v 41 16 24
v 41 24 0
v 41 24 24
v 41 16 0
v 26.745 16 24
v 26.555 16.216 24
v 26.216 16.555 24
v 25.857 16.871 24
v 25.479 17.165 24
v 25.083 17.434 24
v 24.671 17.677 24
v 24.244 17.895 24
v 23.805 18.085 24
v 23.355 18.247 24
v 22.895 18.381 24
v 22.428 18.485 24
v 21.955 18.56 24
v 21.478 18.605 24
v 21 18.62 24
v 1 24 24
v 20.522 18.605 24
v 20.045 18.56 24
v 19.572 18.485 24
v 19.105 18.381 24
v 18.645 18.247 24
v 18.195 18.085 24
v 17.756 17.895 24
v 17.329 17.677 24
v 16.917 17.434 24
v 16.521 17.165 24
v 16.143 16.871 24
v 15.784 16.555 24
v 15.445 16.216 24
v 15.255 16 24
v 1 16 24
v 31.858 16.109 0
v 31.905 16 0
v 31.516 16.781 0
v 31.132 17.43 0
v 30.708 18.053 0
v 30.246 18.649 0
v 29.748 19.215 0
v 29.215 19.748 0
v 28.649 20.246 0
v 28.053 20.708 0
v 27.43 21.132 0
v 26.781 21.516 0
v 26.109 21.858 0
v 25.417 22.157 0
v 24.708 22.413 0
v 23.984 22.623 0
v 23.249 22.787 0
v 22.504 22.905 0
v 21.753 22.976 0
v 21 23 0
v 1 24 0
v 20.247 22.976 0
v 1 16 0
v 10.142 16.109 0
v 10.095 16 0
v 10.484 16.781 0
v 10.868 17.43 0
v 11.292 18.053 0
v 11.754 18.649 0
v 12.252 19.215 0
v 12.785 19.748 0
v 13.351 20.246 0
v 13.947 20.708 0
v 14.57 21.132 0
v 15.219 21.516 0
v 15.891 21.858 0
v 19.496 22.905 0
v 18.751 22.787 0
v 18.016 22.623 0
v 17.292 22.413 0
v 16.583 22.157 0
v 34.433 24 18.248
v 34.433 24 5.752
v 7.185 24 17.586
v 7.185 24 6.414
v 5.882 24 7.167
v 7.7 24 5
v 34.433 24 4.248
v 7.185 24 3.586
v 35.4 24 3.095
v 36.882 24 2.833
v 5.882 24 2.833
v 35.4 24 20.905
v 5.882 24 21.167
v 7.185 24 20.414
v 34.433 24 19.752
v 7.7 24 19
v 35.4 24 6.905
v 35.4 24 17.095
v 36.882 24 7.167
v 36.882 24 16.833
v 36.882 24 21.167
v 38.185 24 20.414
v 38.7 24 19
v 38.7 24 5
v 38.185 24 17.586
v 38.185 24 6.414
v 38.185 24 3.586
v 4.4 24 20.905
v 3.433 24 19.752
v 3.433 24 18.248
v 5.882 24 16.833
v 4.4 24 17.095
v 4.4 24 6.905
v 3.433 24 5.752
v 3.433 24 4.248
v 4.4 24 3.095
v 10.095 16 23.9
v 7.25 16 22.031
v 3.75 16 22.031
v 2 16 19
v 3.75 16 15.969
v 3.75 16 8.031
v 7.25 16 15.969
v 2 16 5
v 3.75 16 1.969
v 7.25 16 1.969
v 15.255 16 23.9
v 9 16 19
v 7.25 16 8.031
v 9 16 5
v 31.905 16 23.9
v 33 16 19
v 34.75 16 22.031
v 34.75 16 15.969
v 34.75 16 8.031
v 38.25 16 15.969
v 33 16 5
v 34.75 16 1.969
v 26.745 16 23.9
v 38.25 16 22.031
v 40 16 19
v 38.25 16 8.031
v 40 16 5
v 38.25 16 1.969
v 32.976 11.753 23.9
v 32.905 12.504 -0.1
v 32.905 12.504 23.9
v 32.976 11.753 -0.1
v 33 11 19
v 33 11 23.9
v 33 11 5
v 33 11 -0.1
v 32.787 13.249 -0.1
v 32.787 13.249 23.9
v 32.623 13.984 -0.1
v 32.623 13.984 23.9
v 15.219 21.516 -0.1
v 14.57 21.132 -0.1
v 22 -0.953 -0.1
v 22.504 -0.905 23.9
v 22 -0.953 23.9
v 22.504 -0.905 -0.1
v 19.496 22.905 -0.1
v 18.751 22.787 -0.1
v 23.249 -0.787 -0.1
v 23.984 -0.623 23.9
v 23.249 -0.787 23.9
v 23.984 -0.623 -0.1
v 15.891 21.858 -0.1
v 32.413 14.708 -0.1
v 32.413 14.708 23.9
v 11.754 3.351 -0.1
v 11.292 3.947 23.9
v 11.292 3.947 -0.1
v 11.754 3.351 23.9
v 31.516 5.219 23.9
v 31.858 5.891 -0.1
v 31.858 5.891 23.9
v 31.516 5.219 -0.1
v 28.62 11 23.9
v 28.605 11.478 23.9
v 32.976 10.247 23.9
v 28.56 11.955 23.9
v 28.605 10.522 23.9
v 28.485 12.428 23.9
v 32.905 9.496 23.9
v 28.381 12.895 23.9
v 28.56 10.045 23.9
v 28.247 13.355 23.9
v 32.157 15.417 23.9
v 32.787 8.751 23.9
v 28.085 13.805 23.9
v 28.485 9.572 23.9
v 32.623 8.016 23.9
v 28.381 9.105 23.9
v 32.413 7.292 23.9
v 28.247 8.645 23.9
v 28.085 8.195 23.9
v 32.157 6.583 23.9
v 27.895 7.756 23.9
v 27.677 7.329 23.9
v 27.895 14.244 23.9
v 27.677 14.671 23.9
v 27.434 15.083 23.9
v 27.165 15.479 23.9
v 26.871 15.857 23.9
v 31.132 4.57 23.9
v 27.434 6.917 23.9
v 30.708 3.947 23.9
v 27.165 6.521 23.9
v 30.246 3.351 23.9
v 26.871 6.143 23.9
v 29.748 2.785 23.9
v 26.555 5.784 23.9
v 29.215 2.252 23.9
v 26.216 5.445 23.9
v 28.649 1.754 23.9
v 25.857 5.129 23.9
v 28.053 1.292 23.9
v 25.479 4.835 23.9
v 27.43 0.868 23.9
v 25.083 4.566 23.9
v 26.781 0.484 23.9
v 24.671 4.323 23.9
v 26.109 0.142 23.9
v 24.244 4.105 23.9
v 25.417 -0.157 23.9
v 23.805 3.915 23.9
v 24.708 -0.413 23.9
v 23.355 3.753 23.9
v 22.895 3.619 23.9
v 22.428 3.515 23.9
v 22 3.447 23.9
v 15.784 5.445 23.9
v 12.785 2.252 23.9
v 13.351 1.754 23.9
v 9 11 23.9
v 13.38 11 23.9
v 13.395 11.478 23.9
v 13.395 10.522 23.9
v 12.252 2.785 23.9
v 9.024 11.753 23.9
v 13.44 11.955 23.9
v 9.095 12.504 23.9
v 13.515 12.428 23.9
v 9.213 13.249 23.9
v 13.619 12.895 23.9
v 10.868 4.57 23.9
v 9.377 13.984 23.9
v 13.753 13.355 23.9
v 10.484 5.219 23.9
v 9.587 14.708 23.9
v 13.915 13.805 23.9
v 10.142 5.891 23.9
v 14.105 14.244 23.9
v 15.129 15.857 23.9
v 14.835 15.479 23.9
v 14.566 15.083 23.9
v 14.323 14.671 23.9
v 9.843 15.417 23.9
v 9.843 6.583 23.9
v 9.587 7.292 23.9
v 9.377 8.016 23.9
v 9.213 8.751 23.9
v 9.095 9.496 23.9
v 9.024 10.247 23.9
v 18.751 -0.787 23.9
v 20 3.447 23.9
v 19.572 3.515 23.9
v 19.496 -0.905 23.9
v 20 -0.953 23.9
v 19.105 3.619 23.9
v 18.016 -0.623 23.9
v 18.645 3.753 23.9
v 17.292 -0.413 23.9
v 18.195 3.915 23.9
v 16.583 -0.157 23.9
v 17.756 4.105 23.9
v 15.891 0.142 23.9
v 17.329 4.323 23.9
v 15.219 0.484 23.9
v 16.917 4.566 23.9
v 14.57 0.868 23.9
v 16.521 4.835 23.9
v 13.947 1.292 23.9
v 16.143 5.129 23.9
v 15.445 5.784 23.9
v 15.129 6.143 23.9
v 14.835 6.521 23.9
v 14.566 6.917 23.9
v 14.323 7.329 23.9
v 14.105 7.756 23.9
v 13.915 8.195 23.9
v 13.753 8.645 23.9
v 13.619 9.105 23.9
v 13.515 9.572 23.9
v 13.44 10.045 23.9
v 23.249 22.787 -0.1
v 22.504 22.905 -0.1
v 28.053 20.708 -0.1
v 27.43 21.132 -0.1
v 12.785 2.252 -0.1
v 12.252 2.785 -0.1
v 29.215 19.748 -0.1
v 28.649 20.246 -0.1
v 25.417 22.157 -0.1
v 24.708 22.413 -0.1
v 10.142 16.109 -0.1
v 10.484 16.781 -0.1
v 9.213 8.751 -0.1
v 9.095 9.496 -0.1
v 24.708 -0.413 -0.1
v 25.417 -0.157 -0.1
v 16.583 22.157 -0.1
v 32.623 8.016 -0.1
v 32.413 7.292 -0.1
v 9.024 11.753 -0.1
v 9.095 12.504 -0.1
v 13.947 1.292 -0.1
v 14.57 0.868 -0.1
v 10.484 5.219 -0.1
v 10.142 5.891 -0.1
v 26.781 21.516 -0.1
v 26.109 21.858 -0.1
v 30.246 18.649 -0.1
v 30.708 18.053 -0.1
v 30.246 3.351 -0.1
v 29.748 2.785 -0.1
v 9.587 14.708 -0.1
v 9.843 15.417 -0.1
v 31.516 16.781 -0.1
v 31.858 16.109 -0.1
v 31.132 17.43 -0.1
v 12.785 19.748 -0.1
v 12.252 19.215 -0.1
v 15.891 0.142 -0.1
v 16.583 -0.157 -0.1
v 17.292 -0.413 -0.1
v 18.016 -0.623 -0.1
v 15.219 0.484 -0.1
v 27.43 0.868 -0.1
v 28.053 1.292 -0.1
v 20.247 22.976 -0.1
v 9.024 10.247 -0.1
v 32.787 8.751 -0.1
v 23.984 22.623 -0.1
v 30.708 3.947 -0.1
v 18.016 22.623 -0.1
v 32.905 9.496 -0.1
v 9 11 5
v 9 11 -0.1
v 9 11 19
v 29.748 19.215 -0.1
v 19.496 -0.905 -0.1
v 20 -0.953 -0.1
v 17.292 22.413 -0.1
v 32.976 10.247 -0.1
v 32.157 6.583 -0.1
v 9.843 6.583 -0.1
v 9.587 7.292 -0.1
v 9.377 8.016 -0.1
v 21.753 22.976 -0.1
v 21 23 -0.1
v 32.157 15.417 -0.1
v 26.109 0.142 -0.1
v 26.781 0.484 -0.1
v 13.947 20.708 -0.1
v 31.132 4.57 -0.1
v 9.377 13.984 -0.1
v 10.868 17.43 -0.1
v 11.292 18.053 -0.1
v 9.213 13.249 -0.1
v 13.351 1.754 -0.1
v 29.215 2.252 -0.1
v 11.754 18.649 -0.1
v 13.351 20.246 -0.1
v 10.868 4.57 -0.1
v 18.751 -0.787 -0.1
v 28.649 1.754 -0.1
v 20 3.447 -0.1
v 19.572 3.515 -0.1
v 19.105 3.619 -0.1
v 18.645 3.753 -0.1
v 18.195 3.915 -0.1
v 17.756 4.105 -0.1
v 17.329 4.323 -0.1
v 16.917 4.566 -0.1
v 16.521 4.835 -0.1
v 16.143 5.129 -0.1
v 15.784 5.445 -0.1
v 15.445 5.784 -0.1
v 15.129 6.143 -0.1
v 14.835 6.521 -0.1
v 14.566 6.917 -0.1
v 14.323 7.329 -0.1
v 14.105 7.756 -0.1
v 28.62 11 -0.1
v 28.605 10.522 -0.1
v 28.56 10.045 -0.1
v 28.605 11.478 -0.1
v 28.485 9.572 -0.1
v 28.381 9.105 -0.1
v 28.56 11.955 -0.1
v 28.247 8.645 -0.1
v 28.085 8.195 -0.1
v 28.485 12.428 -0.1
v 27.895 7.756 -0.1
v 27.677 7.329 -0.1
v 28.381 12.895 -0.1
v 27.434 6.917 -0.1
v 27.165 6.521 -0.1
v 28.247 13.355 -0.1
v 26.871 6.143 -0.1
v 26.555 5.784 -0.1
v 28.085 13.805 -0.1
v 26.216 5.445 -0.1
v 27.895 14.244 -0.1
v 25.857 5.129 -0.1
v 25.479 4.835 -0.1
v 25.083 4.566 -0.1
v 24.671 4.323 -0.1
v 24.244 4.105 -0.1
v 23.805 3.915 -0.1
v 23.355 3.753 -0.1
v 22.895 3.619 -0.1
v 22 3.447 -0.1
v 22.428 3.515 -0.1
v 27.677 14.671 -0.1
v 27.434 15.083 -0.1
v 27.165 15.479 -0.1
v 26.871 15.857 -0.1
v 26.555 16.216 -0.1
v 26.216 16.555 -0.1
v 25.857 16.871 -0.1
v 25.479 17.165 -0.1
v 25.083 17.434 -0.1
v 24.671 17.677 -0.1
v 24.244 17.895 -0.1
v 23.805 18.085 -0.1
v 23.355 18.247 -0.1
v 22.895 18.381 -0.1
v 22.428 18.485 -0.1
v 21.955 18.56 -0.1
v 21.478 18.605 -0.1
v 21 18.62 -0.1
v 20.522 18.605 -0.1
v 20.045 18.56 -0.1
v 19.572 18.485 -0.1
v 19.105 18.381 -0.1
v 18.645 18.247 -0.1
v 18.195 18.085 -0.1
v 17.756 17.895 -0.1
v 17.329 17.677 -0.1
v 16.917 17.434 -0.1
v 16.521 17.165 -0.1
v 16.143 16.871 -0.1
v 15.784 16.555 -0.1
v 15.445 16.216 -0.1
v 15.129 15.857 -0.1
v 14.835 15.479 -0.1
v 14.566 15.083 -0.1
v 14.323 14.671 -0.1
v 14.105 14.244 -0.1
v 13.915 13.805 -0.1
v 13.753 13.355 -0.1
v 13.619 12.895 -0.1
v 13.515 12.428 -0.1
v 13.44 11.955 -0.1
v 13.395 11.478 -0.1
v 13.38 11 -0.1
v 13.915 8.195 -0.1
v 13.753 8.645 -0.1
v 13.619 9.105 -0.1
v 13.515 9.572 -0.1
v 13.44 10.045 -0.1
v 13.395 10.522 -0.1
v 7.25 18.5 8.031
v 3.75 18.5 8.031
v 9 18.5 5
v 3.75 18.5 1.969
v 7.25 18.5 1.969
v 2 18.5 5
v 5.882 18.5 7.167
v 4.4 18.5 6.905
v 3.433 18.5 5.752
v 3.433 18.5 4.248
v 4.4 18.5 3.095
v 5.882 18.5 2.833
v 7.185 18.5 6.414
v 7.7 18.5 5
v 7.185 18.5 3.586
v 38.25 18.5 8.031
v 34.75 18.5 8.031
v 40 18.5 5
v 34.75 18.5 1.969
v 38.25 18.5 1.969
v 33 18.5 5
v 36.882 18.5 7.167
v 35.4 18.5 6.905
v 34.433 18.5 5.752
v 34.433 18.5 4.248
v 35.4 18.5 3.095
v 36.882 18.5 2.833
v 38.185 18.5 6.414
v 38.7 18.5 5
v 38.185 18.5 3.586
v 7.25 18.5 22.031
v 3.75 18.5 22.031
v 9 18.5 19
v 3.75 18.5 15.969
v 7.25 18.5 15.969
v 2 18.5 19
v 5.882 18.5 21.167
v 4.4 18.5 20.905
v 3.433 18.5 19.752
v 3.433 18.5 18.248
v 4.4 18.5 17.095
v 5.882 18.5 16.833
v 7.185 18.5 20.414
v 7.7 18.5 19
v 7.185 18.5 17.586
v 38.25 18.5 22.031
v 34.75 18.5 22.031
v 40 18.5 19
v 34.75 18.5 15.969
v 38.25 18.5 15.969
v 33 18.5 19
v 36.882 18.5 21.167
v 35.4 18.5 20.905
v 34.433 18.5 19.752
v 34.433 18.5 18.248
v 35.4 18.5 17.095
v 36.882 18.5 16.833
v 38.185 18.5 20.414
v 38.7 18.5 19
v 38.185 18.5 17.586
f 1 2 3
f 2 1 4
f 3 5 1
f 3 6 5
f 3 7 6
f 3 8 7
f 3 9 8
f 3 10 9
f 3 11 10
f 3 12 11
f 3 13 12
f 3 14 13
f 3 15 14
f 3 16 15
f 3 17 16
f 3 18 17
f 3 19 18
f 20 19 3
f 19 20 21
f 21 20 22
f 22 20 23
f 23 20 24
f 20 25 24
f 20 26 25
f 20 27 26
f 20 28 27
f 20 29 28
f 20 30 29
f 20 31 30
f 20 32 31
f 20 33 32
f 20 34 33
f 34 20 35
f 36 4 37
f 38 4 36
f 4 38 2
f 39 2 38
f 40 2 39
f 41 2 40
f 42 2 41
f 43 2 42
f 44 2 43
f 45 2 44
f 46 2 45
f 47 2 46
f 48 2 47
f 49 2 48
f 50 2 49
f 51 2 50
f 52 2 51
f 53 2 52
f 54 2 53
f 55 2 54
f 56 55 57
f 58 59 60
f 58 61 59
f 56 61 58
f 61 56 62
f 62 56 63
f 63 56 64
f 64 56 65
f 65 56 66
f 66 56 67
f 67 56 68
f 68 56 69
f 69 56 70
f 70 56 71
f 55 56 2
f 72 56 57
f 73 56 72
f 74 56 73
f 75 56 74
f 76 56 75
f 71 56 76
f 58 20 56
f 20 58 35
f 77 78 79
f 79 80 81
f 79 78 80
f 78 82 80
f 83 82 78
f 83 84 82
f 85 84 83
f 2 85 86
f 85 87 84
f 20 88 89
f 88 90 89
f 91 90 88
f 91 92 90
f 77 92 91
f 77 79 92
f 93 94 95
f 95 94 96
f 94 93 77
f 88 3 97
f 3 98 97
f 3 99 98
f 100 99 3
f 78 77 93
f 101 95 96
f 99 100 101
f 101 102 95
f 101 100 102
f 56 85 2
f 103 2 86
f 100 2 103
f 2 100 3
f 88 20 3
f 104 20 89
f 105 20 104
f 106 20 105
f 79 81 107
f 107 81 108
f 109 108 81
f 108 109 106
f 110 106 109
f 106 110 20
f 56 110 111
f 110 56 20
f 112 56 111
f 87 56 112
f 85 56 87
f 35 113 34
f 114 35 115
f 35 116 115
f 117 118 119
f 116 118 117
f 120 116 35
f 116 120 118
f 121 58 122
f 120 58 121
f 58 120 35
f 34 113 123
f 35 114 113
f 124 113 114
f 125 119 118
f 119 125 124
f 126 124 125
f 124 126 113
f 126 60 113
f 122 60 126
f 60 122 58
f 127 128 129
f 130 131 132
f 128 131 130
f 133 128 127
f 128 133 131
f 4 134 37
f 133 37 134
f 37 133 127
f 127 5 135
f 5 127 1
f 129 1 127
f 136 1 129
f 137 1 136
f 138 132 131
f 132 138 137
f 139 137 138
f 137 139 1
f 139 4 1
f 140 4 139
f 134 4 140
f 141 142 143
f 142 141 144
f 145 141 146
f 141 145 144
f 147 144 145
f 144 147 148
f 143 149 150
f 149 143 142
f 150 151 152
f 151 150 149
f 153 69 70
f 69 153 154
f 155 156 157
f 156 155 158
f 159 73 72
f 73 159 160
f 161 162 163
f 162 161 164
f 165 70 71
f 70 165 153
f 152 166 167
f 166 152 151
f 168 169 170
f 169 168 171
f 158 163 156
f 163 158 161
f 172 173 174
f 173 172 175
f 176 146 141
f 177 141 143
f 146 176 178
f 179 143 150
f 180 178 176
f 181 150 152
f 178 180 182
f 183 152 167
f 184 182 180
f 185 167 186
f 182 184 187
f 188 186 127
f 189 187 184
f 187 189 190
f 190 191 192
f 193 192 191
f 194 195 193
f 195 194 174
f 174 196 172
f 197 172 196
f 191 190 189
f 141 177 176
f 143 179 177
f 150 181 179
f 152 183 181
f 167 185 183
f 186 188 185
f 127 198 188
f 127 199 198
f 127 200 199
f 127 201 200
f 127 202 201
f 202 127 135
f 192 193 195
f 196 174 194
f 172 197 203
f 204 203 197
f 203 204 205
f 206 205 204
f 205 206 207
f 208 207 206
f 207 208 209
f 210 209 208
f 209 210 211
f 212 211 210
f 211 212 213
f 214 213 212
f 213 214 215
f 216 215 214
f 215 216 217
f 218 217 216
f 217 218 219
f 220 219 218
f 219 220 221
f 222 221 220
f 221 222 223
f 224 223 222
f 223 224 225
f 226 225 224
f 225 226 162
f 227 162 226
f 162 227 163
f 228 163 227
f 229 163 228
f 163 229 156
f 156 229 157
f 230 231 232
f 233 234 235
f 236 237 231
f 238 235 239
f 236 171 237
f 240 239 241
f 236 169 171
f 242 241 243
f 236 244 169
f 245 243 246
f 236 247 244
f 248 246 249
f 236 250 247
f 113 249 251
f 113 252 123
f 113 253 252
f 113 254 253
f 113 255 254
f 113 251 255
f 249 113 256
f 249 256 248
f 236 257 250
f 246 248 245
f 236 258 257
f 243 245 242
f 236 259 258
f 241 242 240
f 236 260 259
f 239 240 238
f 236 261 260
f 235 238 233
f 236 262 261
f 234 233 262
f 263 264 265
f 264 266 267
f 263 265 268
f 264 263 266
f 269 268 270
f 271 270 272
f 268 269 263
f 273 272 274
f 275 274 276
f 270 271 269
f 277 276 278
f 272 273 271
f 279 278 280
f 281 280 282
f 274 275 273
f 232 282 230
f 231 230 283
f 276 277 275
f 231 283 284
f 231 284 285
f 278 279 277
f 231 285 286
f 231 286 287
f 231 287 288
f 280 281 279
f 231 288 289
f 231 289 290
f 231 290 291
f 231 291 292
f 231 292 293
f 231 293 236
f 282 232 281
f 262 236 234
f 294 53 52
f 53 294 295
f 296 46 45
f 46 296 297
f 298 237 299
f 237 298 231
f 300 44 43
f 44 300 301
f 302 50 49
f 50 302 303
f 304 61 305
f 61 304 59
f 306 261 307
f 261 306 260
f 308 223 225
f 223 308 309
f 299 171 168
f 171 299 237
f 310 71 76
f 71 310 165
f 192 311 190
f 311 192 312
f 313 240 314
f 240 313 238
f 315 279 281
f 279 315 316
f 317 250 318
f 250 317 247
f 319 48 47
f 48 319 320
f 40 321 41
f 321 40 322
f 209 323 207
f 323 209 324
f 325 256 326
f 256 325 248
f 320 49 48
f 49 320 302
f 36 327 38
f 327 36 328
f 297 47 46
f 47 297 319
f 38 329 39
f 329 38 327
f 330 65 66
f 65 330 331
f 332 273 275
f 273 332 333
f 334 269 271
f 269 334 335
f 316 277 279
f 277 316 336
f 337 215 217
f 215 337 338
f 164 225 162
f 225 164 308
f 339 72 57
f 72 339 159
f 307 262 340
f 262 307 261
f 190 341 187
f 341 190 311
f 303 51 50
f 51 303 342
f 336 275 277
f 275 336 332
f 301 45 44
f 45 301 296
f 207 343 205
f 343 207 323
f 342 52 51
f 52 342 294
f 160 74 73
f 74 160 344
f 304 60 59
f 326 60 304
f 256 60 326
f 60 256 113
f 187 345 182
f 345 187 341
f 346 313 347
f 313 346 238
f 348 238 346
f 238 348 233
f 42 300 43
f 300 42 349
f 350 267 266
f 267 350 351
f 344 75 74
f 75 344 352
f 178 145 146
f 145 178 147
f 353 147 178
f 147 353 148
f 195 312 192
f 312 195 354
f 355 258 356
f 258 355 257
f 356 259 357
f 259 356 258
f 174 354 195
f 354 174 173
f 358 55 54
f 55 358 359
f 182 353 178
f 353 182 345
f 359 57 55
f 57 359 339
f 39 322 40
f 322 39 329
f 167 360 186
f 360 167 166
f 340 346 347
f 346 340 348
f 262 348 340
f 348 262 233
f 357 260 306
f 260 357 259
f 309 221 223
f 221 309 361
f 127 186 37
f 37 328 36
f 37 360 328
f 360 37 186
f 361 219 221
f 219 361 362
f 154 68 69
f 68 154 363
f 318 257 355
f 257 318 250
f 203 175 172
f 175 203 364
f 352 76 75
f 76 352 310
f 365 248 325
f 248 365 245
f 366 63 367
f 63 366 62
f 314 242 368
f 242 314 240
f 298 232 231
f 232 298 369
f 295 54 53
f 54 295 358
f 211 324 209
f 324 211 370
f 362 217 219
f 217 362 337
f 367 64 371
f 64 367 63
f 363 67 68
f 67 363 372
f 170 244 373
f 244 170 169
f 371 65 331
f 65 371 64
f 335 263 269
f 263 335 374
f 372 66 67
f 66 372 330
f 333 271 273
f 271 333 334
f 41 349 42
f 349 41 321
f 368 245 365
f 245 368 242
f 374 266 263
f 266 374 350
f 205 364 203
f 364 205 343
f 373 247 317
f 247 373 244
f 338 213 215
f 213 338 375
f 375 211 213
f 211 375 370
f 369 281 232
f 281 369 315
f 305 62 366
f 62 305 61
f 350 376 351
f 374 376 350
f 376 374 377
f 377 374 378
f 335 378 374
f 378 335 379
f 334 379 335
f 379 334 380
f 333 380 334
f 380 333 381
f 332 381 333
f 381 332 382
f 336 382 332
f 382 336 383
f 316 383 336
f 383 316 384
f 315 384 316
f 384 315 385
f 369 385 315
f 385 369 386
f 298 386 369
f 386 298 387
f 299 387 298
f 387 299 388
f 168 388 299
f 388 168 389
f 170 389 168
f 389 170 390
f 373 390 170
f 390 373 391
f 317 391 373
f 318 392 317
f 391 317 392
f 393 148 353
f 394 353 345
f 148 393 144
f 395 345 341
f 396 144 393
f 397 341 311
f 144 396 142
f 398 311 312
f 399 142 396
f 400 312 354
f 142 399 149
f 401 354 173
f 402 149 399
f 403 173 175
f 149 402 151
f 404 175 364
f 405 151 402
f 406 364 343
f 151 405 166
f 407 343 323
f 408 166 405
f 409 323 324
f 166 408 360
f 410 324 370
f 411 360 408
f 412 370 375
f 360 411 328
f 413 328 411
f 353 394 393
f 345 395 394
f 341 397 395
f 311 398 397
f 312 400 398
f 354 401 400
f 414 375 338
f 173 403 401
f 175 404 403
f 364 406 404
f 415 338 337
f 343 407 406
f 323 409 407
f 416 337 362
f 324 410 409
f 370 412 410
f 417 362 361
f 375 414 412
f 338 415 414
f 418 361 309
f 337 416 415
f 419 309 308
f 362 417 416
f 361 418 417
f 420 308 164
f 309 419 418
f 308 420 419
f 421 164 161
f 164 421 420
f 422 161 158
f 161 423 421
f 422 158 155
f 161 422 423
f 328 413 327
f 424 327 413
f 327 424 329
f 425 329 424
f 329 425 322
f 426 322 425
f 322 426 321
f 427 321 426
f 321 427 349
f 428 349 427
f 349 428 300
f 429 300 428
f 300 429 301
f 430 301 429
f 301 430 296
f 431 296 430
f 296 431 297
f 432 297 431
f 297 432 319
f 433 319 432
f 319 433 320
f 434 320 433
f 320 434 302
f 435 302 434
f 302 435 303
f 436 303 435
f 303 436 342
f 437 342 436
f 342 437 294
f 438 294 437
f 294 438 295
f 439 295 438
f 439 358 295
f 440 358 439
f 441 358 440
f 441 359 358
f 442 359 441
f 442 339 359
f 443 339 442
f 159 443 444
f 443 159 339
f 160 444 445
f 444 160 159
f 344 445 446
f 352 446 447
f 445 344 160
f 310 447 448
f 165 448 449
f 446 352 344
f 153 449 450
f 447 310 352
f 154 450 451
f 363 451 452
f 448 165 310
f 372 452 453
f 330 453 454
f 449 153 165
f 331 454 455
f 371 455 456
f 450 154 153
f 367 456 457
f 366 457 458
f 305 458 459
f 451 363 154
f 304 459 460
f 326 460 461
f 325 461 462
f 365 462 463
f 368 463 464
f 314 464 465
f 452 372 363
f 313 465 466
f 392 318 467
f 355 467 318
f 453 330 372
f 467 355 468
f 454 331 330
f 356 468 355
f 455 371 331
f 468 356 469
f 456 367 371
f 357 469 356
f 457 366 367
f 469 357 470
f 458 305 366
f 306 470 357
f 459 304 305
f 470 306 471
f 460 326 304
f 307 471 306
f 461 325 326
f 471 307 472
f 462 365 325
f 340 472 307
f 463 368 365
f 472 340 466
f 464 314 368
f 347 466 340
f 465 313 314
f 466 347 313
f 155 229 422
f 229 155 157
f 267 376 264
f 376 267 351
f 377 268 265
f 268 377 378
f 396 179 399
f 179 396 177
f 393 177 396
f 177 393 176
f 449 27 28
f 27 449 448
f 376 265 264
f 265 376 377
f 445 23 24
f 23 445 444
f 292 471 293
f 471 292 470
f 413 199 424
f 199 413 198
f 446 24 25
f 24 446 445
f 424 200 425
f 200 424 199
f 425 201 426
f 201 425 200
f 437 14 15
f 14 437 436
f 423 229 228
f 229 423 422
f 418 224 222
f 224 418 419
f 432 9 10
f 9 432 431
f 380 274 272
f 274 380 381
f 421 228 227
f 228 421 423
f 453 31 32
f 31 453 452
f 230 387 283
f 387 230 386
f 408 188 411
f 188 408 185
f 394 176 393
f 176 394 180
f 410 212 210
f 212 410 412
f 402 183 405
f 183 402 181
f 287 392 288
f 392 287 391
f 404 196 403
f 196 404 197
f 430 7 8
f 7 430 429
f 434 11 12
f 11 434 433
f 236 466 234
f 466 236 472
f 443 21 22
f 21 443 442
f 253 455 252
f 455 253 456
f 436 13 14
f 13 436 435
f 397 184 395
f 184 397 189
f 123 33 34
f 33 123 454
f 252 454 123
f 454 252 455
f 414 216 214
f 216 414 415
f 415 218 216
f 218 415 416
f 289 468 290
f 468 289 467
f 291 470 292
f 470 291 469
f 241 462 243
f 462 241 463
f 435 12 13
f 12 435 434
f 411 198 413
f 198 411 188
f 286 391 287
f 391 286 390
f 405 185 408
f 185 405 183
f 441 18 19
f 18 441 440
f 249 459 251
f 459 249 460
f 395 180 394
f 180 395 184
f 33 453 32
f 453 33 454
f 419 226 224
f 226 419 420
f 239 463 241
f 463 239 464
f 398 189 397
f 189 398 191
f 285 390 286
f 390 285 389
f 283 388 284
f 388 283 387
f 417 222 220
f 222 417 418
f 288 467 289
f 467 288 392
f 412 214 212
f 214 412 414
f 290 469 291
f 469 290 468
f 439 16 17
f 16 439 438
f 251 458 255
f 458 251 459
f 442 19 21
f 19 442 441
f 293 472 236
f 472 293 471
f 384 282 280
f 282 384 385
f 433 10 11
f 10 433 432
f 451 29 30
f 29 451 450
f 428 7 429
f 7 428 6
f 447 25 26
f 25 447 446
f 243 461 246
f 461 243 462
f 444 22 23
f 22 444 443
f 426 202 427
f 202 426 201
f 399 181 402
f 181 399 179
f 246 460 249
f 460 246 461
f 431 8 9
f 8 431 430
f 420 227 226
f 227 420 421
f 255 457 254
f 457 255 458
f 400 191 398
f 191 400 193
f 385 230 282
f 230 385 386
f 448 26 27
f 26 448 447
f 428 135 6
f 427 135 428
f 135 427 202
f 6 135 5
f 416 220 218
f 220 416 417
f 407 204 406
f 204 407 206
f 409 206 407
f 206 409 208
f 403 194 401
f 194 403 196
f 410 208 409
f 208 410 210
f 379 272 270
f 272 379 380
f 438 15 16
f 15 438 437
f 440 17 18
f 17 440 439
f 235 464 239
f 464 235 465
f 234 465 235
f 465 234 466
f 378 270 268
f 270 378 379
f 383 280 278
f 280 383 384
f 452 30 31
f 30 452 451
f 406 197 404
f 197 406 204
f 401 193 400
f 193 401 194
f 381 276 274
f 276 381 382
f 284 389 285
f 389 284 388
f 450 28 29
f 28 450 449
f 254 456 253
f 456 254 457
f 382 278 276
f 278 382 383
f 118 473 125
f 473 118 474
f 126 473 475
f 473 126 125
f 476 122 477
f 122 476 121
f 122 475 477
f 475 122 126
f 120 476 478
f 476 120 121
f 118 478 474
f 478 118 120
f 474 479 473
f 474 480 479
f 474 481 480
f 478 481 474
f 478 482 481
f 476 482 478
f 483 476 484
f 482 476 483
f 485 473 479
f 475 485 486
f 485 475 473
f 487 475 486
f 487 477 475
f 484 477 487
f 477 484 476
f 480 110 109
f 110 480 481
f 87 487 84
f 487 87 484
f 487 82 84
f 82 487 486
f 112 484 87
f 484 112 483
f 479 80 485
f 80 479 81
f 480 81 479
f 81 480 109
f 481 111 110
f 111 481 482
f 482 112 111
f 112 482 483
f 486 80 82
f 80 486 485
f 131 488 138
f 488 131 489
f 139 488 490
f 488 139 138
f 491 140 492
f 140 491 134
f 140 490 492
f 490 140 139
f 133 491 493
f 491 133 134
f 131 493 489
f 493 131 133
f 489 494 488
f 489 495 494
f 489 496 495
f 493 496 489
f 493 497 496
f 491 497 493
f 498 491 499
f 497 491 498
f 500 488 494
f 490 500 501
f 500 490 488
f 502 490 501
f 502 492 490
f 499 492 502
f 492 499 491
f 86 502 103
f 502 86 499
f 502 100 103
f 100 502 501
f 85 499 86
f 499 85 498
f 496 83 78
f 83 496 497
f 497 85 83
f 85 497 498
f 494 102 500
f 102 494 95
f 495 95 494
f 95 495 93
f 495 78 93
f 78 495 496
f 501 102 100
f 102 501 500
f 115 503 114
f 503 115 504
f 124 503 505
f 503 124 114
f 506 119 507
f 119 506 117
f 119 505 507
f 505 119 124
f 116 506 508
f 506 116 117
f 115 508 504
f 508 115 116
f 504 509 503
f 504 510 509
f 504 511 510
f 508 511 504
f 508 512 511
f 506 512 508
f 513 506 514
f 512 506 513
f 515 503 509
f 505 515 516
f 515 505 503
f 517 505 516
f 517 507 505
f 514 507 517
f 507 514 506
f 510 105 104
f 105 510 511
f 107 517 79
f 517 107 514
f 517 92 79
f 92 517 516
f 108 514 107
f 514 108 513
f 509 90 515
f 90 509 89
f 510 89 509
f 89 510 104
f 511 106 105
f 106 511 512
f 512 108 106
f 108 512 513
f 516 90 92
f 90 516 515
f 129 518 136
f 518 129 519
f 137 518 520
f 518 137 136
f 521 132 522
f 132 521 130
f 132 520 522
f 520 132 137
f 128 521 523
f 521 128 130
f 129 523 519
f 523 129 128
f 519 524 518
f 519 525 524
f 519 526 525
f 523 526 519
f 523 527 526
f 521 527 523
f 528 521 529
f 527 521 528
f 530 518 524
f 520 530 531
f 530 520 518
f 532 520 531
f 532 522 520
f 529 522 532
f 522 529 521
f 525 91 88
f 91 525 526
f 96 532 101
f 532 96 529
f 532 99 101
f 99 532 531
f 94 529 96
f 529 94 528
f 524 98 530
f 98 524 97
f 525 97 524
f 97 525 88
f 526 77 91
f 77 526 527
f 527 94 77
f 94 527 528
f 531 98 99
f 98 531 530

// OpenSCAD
// http://www.thingiverse.com/thing:10287

m3_nut_diameter= 7;
m3_diameter=4.4;

module block(){


difference(){
union(){
difference(){
// cube([22,22,24]); 


//translate([11,11,3]) cylinder(72,7.55,7.55,$fn=100);
//translate([11,11,-0.1]) cylinder(72,6,6,$fn=100);

}


translate([-9,16,0]) cube ([40,8,24]);

translate([11,11,-0.1]) cylinder(24,12,12,$fn=100);

 

}


translate([10,-2,-0.1]) cube([2,14,26]); 

translate([11,11,3]) cylinder(72,7.55,7.55,$fn=100);
translate([11,11,-0.1]) cylinder(72,6,6,$fn=100);

// UNCOMMENT FOR NO END STOP
translate([11,11,-0.1]) cylinder(72,7.62,7.62,$fn=100);

translate(v = [-4.5,14, 5]) rotate(a=[270,0,0]) cylinder(h = 9, r=m3_nut_diameter/2, $fn=6, center=true); // M3 hex 
translate(v = [-4.5, 14, 5]) rotate(a=[270,0,0]) cylinder(h = 100, r=m3_diameter/2, $fn=9, center=true); // M3 hole

translate(v = [26.5,14, 5]) rotate(a=[270,0,0]) cylinder(h = 9, r=m3_nut_diameter/2, $fn=6, center=true); // M3 hex 
translate(v = [26.5, 14, 5]) rotate(a=[270,0,0]) cylinder(h = 100, r=m3_diameter/2, $fn=9, center=true); // M3 hole

translate(v = [-4.5,14, 19]) rotate(a=[270,0,0]) cylinder(h = 9, r=m3_nut_diameter/2, $fn=6, center=true); // M3 hex 
translate(v = [-4.5, 14,19]) rotate(a=[270,0,0]) cylinder(h = 100, r=m3_diameter/2, $fn=9, center=true); // M3 hole

translate(v = [26.5,14,19]) rotate(a=[270,0,0]) cylinder(h = 9, r=m3_nut_diameter/2, $fn=6, center=true); // M3 hex 
translate(v = [26.5, 14, 19]) rotate(a=[270,0,0]) cylinder(h = 100, r=m3_diameter/2, $fn=9, center=true); // M3 hole


//translate(v = [-4, -8, 2]) rotate(a=[270,0,0]) cylinder(h = 9, r=m3_nut_diameter/2, $fn=6, center=true); // M3 hex
//translate(v = [-4, -8, 3.75]) rotate(a=[270,0,0]) cylinder(h = 100, r=m3_diameter/2, $fn=9, center=true); // M3 hole

}
}

translate([10,0,0])
block();

//translate(v = [-4,20, 5]) rotate(a=[270,0,0]) cylinder(h = 9, r=m3_nut_diameter/2, $fn=6, center=true); // M3 hex 
//translate(v = [-4, 20, 5]) rotate(a=[270,0,0]) cylinder(h = 100, r=m3_diameter/2, $fn=9, center=true); // M3 hole
//translate(v = [-4, -8, 2]) rotate(a=[270,0,0]) cylinder(h = 9, r=m3_nut_diameter/2, $fn=6, center=true); // M3 hex
//translate(v = [-4, -8, 3.75]) rotate(a=[270,0,0]) cylinder(h = 100, r=m3_diameter/2, $fn=9, center=true); // M3 hole
